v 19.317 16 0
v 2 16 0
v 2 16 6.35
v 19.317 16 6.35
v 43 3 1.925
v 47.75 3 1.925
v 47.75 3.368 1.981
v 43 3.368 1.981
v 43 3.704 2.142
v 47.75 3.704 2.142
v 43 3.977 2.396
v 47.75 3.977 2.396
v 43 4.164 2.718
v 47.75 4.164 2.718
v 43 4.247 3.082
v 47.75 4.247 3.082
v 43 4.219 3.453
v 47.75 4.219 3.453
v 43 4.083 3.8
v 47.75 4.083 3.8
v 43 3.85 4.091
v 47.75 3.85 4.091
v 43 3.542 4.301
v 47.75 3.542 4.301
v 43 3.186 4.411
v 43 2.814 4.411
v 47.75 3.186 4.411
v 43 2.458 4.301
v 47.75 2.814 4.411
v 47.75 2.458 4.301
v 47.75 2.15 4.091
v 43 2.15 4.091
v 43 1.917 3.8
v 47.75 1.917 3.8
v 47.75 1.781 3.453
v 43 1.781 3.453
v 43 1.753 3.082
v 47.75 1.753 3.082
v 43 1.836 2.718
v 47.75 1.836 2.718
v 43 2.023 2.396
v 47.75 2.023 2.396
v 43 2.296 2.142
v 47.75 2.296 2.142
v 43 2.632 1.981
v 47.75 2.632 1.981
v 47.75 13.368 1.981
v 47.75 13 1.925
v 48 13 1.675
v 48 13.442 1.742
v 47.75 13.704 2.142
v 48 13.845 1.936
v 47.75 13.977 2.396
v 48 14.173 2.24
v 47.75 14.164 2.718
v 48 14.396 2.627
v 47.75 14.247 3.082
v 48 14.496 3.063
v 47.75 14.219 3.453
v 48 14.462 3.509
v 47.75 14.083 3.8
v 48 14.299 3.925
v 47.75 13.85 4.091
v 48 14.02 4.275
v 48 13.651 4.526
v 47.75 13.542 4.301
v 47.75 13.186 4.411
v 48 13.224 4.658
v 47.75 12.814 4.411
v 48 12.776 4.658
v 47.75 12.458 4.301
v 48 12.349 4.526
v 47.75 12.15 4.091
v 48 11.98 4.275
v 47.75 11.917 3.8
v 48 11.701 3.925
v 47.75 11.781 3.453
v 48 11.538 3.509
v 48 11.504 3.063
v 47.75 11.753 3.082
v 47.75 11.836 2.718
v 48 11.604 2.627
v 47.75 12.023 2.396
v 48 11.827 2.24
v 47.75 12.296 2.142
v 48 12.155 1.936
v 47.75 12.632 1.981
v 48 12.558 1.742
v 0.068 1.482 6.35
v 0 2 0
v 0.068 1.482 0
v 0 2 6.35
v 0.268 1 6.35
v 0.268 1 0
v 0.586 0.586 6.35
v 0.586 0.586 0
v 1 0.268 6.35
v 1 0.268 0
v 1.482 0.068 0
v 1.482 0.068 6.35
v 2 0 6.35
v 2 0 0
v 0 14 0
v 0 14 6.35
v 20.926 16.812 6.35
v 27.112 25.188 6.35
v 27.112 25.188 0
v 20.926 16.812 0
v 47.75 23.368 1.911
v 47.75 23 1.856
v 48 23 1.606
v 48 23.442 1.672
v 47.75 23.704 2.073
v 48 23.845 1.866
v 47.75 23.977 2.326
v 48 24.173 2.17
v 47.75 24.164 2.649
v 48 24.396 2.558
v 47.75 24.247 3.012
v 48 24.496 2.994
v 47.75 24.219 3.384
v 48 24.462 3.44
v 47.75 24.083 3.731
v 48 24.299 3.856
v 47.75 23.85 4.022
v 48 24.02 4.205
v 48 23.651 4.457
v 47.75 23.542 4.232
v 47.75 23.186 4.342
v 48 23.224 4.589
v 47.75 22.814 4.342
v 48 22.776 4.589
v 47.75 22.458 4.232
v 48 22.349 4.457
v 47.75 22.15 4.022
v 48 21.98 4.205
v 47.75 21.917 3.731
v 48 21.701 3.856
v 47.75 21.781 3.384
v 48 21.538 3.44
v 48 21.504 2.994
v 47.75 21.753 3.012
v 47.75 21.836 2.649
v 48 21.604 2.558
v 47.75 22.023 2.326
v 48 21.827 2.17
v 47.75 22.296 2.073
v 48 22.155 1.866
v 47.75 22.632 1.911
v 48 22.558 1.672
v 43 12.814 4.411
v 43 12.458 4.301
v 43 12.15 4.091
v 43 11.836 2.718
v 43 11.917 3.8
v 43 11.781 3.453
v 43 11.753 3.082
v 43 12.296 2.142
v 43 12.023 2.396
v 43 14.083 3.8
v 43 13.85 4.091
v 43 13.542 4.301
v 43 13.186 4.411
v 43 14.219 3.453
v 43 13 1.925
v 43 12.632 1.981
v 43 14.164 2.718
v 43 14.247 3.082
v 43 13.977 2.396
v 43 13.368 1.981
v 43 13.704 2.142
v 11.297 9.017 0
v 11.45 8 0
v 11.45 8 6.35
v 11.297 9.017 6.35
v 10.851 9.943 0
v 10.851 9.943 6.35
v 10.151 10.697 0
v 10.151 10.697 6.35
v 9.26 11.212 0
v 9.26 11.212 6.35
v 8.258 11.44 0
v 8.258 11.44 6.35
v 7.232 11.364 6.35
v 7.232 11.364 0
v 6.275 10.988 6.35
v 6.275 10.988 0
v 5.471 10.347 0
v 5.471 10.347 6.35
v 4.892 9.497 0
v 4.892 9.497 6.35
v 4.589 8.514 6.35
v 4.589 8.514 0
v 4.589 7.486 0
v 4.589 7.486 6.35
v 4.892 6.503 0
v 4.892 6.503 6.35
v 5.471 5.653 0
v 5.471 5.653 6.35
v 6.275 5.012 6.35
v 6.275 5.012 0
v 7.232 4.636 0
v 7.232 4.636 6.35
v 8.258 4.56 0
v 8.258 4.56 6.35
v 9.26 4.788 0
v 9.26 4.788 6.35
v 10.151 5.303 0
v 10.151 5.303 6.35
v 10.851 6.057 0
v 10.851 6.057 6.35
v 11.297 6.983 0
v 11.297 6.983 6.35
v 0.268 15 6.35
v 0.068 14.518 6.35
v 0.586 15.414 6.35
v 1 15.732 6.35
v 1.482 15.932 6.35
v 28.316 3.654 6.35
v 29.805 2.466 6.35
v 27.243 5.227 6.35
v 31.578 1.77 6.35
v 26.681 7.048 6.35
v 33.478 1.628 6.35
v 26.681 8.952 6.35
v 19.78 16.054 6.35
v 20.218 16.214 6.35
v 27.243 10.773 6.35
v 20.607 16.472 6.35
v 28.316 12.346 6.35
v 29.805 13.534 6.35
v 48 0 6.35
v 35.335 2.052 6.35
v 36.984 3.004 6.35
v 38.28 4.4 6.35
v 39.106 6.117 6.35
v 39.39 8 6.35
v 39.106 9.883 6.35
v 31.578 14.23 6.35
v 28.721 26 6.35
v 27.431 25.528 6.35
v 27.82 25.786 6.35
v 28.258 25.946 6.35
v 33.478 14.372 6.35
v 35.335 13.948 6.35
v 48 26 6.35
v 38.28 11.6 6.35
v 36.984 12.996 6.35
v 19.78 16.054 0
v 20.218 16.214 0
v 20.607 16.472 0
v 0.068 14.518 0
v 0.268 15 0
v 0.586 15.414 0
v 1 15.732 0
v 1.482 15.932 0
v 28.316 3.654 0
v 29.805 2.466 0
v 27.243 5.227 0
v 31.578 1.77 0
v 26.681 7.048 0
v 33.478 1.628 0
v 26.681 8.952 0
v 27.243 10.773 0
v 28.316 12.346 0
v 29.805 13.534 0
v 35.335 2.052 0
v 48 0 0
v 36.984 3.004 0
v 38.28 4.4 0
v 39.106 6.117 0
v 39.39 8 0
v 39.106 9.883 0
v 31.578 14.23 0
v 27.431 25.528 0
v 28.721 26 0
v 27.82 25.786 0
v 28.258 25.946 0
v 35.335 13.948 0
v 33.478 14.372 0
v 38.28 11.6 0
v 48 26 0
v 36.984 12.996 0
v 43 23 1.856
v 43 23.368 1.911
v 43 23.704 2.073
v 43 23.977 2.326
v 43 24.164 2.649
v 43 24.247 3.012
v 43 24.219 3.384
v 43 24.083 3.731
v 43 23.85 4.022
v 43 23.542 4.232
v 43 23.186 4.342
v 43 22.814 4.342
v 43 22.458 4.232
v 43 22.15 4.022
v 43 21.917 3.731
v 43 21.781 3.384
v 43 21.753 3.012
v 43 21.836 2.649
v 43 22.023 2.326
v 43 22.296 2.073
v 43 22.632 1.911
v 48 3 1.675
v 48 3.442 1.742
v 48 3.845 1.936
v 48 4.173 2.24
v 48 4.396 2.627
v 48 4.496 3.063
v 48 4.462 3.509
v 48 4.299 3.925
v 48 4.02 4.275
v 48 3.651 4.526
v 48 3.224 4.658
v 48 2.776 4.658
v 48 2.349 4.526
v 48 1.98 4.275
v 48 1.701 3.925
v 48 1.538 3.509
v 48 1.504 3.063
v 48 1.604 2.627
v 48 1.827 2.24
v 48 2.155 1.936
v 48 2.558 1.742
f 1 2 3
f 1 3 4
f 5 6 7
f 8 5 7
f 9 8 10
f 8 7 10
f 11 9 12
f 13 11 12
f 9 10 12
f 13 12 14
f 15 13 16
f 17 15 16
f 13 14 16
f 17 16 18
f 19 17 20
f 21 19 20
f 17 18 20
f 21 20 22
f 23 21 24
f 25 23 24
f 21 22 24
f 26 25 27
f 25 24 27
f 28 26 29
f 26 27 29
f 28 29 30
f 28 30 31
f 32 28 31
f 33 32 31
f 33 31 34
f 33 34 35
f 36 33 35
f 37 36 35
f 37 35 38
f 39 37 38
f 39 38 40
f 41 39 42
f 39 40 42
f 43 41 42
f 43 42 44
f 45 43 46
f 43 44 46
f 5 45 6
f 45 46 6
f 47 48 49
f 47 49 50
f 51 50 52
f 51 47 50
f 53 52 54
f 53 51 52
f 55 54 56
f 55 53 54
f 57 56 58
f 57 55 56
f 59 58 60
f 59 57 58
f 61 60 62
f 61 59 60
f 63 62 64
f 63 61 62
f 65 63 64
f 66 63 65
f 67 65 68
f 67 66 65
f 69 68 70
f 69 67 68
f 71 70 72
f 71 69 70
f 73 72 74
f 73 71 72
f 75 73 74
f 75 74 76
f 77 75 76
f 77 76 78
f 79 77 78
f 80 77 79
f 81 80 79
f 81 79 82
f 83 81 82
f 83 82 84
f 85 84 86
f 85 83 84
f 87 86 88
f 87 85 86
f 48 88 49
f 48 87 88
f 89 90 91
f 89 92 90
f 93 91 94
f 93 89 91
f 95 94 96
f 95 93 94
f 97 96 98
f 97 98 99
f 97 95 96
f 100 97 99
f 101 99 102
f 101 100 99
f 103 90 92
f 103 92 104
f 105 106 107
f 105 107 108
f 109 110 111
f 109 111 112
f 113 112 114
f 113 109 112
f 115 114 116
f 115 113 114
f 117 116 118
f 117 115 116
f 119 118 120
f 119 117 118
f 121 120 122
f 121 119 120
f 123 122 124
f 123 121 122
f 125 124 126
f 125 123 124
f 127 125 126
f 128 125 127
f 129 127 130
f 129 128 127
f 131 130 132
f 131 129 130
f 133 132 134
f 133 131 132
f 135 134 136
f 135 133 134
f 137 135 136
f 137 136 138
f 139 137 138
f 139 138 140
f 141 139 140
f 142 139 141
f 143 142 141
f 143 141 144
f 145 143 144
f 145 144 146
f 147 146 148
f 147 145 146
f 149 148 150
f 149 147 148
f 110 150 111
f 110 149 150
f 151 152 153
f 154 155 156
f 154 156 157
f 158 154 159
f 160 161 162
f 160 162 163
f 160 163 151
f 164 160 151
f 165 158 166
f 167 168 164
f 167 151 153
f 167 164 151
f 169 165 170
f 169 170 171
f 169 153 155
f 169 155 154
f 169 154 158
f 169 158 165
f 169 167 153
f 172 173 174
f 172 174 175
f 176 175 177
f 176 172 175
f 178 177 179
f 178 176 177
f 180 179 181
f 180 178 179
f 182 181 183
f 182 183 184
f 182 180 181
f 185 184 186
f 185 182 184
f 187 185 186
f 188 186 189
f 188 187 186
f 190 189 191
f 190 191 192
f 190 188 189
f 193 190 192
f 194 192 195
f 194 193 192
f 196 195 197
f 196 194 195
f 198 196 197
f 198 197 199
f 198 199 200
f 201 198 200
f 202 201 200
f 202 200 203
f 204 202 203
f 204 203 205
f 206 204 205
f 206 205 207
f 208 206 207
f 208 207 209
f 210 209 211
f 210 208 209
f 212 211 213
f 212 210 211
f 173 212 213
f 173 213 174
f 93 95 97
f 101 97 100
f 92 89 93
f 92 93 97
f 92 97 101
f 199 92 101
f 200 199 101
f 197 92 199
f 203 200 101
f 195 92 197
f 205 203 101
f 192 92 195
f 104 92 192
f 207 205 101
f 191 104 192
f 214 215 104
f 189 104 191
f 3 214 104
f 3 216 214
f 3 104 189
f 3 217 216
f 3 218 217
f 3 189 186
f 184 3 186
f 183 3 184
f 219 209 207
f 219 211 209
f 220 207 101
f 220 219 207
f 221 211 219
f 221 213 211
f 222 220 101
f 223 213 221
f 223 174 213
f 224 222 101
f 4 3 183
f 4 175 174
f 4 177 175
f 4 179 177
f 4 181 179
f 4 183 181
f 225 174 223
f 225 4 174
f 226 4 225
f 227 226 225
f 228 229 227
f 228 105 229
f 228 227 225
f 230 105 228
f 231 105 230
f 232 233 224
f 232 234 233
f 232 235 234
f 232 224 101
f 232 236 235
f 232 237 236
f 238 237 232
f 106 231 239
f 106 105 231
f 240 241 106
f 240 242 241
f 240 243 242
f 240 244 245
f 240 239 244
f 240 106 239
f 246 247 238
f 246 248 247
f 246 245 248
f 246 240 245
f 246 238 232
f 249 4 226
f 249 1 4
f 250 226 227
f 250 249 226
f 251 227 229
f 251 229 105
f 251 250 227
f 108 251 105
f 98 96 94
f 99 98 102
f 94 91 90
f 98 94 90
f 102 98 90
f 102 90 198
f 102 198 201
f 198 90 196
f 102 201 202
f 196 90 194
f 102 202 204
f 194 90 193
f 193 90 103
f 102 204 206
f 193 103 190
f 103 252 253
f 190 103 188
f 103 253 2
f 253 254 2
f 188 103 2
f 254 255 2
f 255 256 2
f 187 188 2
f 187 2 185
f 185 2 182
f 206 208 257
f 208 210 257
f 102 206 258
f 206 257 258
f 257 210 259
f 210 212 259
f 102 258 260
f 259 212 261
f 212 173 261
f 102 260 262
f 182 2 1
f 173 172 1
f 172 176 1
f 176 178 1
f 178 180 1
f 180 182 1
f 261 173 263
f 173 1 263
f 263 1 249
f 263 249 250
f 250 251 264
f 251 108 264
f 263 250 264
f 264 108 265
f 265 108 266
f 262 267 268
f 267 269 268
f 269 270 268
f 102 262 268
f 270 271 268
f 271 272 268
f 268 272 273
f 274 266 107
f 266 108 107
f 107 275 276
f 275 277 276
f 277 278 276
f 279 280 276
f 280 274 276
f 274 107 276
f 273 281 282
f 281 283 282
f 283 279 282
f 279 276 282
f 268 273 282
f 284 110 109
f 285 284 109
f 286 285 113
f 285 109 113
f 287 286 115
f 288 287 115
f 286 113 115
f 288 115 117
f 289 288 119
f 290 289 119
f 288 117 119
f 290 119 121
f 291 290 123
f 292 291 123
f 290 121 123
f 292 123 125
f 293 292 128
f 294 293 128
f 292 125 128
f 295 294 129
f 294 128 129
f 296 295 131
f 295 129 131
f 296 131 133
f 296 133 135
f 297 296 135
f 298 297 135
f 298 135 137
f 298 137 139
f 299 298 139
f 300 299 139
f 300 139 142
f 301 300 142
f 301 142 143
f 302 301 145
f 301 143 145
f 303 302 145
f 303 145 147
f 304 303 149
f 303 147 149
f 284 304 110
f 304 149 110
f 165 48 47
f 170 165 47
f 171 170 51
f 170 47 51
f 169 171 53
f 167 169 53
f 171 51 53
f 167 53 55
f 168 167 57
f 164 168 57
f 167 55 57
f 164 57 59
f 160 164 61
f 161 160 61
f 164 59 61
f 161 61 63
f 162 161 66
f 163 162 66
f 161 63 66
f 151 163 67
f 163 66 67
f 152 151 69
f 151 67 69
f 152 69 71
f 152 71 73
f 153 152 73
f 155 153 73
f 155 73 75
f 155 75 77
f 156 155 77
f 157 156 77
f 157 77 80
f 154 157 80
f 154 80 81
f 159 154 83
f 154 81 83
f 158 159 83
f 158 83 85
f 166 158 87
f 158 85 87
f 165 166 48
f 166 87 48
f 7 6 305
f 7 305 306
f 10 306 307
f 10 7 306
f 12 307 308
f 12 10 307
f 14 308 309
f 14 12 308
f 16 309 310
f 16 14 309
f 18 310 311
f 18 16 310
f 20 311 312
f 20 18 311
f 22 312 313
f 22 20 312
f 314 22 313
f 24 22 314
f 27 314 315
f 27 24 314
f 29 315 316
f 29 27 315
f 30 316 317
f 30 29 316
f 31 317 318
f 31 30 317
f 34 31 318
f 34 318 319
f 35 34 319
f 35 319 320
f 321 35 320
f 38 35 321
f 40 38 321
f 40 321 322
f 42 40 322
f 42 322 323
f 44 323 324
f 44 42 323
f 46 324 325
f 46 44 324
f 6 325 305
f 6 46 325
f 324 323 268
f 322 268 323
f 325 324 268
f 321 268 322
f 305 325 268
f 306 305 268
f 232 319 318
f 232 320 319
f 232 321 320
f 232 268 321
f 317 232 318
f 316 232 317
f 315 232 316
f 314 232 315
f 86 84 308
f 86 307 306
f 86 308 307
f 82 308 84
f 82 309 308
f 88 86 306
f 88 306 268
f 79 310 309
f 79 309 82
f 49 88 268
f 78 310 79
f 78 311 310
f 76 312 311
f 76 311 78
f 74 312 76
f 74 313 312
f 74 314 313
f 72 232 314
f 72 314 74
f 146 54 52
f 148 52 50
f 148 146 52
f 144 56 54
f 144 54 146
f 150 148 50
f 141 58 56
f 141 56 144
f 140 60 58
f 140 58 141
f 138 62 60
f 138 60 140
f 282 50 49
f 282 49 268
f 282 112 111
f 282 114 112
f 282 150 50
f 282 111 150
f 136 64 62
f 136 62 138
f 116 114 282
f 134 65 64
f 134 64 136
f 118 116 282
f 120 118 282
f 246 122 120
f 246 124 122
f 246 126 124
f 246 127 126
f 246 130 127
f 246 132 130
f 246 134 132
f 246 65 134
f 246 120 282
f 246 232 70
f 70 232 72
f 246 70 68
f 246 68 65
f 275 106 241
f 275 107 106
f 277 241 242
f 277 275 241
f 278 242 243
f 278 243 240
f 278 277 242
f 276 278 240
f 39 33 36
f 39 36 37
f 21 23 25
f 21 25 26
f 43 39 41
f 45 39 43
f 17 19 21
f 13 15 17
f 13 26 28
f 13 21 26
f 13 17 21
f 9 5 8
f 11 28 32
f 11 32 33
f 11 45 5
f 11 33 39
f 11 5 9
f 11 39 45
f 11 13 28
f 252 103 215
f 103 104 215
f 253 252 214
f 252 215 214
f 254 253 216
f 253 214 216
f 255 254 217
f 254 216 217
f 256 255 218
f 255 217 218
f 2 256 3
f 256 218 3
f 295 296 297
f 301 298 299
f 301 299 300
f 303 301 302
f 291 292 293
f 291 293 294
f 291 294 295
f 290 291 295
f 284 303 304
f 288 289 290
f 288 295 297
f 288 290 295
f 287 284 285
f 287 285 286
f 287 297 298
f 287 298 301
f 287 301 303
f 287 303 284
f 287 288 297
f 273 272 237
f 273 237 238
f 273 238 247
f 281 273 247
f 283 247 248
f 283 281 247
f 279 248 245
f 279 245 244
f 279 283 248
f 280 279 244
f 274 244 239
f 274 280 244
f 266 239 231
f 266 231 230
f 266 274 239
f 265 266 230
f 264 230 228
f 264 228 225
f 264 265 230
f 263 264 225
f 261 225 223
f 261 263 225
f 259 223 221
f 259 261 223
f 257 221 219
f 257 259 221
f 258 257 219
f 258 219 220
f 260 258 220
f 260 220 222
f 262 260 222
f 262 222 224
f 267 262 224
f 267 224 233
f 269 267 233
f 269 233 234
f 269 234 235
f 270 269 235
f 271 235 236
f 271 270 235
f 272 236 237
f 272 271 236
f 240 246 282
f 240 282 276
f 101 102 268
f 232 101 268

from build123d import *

# Parameters (mm, degrees)
SKETCH1_W           = 48
SKETCH1_H           = 16
BOSS_EXTRUDE1_DEPTH = 6.35
SKETCH1_6_R         = 6.39
SKETCH1_6_R_2       = 3.45
CUT_EXTRUDE1_DEPTH  = 6.35
FILLET1_R           = 2
SKETCH2_R           = 1.25
CUT_EXTRUDE2_DEPTH  = 5
BOSS_EXTRUDE2_DEPTH = 6.35
FILLET2_R           = 2
SKETCH4_R           = 1.25
CUT_EXTRUDE3_DEPTH  = 5
CHAMFER1_SIZE       = 0.25


with BuildPart() as part:
    # Sketch1 → Boss-Extrude1 (new body)
    with BuildSketch(Plane.XY):
        with Locations((24, 8)):
            Rectangle(SKETCH1_W, SKETCH1_H)
    extrude(amount=BOSS_EXTRUDE1_DEPTH)

    # Sketch1<6> → Cut-Extrude1 (cut)
    with BuildSketch(Plane.XY):
        with Locations((33, 8)):
            Circle(SKETCH1_6_R)
        with Locations((8, 8)):
            Circle(SKETCH1_6_R_2)
    extrude(amount=CUT_EXTRUDE1_DEPTH, mode=Mode.SUBTRACT)

    # Fillet1
    fillet1_edges = [part.edges().sort_by_distance(p)[0] for p in [
        (0, 16, 3.175),
        (0, 0, 3.175),
    ]]
    fillet(fillet1_edges, radius=FILLET1_R)

    # Sketch2 → Cut-Extrude2 (cut)
    with BuildSketch(Plane(origin=(48, 0, 0), x_dir=(0, 0, -1), z_dir=(1, 0, 0))):
        with Locations((-3.175, 13)):
            Circle(SKETCH2_R)
        with Locations((-3.175, 3)):
            Circle(SKETCH2_R)
    extrude(amount=-CUT_EXTRUDE2_DEPTH, mode=Mode.SUBTRACT)

    # Sketch3 → Boss-Extrude2 (add)
    with BuildSketch(Plane.XY.offset(6.35)):
        Polygon((20.326281713, 16), (48, 16), (48, 26), (27.712043107, 26), align=None)
    extrude(amount=-BOSS_EXTRUDE2_DEPTH)

    # Fillet2
    fillet2_edges = [part.edges().sort_by_distance(p)[0] for p in [
        (20.326281713, 16, 3.175),
        (27.712043107, 26, 3.175),
    ]]
    fillet(fillet2_edges, radius=FILLET2_R)

    # Sketch4 → Cut-Extrude3 (cut)
    with BuildSketch(Plane(origin=(48, 0, 0), x_dir=(0, 0, -1), z_dir=(1, 0, 0))):
        with Locations((-3.10572404, 23)):
            Circle(SKETCH4_R)
    extrude(amount=-CUT_EXTRUDE3_DEPTH, mode=Mode.SUBTRACT)

    # Chamfer1
    chamfer1_edges = [part.edges().sort_by_distance(p)[0] for p in [
        (48, 3, 4.425),
        (48, 13, 4.425),
        (48, 23, 4.35572404),
    ]]
    chamfer(chamfer1_edges, length=CHAMFER1_SIZE)


solid = part.part
